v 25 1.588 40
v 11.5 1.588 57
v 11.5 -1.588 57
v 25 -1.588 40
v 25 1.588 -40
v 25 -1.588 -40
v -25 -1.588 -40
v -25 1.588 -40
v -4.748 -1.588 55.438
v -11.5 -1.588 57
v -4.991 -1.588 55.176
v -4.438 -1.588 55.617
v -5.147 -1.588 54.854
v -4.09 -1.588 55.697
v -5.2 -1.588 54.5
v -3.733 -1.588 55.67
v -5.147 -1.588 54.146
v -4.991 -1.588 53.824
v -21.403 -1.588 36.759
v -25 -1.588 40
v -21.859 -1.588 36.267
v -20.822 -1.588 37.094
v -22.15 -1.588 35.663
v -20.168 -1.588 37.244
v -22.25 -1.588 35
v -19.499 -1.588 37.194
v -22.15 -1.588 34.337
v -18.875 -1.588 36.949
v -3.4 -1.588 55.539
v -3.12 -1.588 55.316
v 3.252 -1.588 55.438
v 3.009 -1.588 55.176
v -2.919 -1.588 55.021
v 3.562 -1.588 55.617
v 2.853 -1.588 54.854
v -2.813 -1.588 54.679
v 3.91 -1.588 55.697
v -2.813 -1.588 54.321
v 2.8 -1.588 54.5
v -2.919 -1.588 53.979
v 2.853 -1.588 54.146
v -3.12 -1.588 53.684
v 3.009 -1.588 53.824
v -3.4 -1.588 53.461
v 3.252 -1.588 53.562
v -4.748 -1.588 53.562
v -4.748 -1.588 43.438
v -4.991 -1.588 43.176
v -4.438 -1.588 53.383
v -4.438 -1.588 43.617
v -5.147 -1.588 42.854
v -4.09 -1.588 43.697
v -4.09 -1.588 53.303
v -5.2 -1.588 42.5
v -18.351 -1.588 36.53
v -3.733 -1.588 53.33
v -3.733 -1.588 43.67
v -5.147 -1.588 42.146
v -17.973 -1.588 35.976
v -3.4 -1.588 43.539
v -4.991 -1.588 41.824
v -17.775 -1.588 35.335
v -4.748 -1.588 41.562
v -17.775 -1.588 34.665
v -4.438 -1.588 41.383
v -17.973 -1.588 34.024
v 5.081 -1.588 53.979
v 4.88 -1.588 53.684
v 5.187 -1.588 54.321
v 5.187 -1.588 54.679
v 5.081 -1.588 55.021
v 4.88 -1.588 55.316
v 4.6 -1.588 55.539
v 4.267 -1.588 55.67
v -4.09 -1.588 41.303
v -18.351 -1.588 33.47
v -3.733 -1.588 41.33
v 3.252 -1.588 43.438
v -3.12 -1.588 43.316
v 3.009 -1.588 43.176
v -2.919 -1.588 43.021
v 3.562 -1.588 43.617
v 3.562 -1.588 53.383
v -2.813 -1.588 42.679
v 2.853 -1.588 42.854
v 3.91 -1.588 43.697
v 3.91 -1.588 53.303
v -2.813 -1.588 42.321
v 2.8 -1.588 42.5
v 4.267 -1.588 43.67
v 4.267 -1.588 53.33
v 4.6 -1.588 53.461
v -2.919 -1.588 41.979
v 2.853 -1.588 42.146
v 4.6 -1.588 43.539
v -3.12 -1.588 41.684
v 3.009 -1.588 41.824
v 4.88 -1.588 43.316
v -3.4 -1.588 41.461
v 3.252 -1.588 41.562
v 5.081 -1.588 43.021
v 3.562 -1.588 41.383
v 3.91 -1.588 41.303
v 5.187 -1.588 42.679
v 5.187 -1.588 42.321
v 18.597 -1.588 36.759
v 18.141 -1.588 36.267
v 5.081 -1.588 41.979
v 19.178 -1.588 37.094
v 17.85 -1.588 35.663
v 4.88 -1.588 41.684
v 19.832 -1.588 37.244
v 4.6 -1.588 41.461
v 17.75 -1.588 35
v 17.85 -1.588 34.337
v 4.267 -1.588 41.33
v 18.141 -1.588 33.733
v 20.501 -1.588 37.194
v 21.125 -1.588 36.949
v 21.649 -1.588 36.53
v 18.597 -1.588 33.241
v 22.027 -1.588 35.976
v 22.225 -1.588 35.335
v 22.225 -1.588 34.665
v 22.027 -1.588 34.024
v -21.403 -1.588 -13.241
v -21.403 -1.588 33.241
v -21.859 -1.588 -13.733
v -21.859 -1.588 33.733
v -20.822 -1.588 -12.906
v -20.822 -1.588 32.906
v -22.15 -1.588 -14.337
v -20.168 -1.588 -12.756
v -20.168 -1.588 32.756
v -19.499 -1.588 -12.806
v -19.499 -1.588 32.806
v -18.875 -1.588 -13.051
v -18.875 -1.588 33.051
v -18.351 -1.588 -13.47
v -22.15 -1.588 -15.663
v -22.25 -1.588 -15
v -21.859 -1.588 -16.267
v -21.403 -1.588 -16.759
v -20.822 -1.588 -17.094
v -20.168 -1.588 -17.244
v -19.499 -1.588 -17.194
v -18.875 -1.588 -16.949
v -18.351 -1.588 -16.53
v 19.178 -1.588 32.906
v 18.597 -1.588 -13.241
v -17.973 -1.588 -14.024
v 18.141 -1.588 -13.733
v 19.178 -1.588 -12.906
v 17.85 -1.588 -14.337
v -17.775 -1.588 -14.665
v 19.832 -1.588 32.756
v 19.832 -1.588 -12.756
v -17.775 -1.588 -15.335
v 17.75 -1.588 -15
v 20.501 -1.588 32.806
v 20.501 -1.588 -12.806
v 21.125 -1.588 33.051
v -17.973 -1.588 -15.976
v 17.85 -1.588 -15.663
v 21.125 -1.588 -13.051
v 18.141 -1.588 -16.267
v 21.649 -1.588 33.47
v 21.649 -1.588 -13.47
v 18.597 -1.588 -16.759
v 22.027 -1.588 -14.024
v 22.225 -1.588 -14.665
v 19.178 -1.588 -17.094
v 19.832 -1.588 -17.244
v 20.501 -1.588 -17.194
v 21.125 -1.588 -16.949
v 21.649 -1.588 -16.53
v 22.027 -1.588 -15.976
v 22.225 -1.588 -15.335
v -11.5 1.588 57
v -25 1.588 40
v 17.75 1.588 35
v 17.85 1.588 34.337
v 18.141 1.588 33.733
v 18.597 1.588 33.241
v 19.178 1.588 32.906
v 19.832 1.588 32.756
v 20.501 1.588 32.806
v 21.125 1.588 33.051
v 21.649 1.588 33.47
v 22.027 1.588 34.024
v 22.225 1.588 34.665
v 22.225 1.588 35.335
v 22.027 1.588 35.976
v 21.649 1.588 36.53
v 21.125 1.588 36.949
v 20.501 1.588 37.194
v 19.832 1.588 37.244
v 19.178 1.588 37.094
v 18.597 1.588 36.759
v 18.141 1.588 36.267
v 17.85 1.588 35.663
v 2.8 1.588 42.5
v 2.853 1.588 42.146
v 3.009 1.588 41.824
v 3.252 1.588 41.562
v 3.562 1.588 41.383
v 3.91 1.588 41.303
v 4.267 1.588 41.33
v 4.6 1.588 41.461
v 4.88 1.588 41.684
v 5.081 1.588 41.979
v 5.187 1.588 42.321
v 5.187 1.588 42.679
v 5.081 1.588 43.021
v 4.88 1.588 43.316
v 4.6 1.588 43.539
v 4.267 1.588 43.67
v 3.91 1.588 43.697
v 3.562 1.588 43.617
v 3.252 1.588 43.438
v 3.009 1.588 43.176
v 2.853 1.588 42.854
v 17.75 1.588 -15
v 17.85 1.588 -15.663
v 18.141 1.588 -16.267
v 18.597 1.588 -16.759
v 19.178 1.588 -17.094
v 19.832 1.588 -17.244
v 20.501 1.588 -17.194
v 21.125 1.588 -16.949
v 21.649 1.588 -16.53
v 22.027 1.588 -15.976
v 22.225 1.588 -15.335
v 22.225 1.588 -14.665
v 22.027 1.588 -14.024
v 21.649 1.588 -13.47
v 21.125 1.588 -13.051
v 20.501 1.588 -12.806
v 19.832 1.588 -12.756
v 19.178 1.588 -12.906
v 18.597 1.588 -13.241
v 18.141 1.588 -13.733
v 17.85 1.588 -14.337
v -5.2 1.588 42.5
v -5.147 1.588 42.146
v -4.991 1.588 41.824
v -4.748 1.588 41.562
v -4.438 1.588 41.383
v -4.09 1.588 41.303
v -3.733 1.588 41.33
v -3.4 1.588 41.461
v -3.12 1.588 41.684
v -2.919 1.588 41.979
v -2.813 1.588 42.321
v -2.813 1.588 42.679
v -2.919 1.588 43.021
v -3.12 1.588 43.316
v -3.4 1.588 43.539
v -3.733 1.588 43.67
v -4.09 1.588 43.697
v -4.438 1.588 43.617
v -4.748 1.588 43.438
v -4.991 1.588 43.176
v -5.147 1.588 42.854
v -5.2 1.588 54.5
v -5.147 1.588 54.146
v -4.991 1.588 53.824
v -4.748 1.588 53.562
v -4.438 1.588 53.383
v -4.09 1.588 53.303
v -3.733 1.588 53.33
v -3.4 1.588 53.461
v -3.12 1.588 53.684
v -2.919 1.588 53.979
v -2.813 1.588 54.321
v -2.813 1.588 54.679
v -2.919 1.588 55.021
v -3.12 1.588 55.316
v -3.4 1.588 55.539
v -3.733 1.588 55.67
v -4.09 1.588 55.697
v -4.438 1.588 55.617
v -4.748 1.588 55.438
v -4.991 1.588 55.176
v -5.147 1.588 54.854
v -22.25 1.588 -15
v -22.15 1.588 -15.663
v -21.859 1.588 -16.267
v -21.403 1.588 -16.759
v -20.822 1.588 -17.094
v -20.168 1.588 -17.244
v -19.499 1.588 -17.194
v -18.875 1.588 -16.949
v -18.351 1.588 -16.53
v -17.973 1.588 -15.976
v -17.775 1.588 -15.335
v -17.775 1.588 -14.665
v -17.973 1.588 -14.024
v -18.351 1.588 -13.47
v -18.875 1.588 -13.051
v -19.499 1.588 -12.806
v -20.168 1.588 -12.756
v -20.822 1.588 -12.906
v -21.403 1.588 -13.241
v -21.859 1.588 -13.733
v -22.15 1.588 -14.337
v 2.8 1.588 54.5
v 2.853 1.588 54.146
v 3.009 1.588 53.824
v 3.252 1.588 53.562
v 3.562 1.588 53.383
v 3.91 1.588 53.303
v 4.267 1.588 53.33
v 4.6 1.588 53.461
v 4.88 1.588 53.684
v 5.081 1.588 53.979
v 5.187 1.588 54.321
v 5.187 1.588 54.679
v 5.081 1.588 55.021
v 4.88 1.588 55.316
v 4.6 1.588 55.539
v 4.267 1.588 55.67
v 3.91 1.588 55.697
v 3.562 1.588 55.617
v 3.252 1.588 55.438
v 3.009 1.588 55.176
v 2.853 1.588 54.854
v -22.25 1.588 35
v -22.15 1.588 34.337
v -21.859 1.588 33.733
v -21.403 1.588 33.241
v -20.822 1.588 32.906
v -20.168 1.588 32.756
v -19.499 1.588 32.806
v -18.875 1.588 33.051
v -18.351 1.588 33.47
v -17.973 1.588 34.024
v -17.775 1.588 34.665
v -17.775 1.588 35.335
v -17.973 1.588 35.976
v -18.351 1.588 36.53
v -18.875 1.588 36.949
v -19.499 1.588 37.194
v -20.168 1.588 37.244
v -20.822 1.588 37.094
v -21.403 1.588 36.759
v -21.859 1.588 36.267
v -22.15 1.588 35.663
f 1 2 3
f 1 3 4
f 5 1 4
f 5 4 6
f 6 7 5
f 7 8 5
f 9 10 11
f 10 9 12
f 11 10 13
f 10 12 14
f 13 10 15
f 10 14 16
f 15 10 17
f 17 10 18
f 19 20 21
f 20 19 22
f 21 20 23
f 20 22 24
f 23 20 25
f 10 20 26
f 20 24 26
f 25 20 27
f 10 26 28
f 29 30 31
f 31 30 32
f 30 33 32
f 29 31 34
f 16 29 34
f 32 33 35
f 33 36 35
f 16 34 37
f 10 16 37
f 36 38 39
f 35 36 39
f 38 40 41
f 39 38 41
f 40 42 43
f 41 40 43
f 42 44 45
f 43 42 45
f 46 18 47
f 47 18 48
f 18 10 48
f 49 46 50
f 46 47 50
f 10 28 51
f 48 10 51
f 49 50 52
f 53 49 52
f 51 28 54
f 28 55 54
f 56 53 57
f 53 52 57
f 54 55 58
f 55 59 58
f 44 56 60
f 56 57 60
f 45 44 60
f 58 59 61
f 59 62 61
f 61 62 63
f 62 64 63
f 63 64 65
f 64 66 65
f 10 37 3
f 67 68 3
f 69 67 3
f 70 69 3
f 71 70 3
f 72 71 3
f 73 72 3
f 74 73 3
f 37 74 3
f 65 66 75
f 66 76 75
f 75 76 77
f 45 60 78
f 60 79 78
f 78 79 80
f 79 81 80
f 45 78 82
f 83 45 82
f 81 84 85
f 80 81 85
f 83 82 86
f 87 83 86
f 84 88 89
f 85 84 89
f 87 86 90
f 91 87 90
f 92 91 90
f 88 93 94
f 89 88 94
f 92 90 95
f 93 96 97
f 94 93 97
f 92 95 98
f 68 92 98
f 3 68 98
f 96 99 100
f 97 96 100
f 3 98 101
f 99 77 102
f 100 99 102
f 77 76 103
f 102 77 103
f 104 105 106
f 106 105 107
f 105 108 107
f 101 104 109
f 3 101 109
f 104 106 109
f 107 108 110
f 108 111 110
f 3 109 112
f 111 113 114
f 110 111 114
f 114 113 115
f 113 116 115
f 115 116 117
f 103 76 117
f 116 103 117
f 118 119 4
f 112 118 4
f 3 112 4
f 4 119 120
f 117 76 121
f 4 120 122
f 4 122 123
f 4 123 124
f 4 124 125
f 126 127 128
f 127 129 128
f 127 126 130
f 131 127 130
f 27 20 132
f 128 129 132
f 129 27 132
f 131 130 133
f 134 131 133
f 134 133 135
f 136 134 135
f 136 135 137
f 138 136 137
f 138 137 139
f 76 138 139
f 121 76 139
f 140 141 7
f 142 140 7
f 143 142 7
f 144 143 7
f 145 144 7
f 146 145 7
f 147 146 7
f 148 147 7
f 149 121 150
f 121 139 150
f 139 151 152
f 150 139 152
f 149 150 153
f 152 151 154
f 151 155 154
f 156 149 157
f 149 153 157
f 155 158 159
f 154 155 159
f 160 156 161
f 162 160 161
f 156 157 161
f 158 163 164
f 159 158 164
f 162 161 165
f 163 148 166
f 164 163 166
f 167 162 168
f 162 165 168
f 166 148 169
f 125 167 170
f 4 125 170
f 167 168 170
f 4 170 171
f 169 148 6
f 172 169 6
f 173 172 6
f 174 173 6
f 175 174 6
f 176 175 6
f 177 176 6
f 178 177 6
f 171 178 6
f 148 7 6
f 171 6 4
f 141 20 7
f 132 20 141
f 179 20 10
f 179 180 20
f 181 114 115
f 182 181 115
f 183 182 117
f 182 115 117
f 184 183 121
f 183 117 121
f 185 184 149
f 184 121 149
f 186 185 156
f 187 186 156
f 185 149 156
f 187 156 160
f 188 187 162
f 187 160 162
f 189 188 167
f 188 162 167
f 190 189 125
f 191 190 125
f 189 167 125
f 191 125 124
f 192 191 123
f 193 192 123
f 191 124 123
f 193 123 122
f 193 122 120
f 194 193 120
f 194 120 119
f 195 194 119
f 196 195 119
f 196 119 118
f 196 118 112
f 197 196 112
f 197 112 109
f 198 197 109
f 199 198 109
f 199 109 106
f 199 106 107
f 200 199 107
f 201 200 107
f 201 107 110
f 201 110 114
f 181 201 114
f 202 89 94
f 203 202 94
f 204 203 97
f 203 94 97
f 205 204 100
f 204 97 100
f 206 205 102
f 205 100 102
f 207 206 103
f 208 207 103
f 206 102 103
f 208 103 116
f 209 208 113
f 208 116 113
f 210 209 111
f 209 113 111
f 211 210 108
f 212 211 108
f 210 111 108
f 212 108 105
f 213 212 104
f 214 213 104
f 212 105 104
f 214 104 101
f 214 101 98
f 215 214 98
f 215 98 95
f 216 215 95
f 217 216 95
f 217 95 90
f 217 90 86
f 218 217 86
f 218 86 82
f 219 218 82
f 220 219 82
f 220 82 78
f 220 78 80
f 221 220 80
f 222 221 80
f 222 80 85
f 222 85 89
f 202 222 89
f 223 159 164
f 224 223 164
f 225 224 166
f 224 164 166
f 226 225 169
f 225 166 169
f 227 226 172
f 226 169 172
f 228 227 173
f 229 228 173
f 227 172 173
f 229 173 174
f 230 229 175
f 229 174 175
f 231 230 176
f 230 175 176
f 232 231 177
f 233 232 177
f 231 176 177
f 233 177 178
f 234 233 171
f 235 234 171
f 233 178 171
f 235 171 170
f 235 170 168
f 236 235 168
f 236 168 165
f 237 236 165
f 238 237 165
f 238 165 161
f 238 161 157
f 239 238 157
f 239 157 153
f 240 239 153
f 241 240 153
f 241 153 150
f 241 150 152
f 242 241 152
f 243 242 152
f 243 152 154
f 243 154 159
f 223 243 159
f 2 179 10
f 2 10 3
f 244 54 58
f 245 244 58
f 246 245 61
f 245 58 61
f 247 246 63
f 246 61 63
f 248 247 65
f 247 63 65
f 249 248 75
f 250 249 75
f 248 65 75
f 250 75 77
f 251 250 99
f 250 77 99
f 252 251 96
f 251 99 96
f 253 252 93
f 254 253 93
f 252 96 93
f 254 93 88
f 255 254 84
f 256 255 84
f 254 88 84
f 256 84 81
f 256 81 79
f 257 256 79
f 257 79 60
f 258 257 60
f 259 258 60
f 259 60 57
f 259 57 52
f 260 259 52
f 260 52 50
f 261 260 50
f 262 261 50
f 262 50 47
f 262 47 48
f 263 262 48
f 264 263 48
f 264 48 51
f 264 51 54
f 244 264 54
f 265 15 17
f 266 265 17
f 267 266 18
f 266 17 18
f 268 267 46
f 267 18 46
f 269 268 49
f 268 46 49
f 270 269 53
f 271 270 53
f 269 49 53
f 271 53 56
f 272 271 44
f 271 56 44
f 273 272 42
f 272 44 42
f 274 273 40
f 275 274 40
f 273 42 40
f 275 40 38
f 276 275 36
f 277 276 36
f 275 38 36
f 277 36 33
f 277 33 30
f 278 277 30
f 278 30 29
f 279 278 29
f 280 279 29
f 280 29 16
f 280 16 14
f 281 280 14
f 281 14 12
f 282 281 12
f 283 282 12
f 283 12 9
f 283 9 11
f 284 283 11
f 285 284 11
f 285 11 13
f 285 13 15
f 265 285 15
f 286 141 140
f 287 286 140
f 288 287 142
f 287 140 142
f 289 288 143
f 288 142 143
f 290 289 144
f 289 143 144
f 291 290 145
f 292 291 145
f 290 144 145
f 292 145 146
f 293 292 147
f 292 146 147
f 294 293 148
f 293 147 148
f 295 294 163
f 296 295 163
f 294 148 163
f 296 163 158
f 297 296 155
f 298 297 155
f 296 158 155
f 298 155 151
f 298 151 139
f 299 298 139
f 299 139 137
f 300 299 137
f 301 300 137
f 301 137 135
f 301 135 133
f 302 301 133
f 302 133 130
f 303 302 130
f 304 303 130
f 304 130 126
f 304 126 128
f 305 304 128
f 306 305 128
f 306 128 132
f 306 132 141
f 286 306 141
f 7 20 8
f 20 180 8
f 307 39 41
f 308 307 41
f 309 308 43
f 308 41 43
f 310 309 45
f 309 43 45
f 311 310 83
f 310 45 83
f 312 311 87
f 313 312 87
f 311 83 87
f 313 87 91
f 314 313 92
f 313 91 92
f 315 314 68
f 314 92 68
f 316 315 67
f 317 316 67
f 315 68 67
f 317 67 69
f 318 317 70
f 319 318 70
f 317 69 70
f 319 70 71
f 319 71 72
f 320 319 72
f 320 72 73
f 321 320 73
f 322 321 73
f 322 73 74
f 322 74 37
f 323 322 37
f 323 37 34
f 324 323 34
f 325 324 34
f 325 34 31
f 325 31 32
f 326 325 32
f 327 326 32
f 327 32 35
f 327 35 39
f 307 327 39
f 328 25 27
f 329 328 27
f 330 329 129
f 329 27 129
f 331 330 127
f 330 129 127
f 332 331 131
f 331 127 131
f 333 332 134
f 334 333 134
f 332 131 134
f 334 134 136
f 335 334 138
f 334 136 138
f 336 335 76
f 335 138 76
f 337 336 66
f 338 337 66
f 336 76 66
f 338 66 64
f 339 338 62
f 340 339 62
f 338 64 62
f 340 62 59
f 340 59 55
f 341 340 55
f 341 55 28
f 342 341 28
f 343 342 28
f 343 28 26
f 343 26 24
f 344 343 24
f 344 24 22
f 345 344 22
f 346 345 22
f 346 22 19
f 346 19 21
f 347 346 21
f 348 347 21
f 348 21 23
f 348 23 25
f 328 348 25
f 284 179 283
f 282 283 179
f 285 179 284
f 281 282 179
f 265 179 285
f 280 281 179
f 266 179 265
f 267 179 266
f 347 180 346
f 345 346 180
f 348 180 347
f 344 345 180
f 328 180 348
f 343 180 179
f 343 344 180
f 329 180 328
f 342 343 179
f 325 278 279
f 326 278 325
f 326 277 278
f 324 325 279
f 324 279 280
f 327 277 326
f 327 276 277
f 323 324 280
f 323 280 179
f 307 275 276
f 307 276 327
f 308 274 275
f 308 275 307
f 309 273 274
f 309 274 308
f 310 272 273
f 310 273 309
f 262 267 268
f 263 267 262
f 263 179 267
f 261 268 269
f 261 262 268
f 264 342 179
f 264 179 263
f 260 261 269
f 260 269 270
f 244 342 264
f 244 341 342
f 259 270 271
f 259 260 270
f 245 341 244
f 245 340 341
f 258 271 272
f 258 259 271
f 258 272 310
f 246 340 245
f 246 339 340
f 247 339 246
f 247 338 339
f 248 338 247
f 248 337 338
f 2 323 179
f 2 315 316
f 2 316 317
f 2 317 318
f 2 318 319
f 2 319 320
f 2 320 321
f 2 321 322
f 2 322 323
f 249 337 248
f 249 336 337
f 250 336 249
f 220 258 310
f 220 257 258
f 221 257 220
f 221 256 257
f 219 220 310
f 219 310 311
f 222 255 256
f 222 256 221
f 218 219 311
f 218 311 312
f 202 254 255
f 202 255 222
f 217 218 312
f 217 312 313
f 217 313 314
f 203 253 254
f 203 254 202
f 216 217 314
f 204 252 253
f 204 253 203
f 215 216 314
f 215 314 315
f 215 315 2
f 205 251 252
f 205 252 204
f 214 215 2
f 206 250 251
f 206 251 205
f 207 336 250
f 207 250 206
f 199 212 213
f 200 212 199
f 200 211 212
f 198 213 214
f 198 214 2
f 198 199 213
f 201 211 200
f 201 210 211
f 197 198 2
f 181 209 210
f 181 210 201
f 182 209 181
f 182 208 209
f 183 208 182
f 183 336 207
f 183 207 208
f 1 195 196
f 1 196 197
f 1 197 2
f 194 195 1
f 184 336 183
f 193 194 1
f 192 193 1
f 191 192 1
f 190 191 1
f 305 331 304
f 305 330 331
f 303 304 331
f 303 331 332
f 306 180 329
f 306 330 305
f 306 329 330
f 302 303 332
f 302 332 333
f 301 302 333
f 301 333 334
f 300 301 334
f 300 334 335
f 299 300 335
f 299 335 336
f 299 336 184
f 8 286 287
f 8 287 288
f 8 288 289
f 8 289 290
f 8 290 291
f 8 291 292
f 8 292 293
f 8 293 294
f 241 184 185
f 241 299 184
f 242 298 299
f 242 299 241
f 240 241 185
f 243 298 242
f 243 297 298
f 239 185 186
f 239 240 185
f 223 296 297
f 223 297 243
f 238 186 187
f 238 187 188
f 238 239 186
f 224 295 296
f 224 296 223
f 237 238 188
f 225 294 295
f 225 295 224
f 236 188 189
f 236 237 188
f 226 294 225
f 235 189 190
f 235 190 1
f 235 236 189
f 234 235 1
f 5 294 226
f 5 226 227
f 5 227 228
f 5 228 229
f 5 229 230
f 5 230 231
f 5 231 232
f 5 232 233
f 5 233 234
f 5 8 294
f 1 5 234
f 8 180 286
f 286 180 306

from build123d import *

# Parameters (mm, degrees)
SKETCH1_W            = 50
SKETCH1_H            = 80
SKETCH1_W_2          = 23
SKETCH1_H_2          = 17
BOSS_EXTRUDE1_DEPTH  = 1.5875
M2_CLEARANCE_HOLE1_D = 2.4
M4_CLEARANCE_HOLE1_D = 4.5


with BuildPart() as part:
    # Sketch1 → Boss-Extrude1 (new, symmetric)
    with BuildSketch(Plane(origin=(0, 0, 0), x_dir=(1, 0, 0), z_dir=(0, 1, 0))):
        Polygon((-25, -40), (-11.5, -57), (-11.5, -40), align=None)
        Polygon((11.5, -40), (11.5, -57), (25, -40), align=None)
        Rectangle(SKETCH1_W, SKETCH1_H)
        with Locations((0, -48.5)):
            Rectangle(SKETCH1_W_2, SKETCH1_H_2)
    extrude(amount=BOSS_EXTRUDE1_DEPTH, both=True)

    # M2 Clearance Hole1 (through all)
    with Locations(Plane(origin=(0, 1.5875, 0), x_dir=(1, 0, 0), z_dir=(0, 1, 0))):
        with Locations((-4, -54.5), (4, -54.5), (4, -42.5), (-4, -42.5)):
            Hole(M2_CLEARANCE_HOLE1_D / 2)

    # M4 Clearance Hole1 (through all)
    with Locations(Plane(origin=(0, 1.5875, 0), x_dir=(1, 0, 0), z_dir=(0, 1, 0))):
        with Locations((-20, 15), (20, 15), (20, -35), (-20, -35)):
            Hole(M4_CLEARANCE_HOLE1_D / 2)


solid = part.part
